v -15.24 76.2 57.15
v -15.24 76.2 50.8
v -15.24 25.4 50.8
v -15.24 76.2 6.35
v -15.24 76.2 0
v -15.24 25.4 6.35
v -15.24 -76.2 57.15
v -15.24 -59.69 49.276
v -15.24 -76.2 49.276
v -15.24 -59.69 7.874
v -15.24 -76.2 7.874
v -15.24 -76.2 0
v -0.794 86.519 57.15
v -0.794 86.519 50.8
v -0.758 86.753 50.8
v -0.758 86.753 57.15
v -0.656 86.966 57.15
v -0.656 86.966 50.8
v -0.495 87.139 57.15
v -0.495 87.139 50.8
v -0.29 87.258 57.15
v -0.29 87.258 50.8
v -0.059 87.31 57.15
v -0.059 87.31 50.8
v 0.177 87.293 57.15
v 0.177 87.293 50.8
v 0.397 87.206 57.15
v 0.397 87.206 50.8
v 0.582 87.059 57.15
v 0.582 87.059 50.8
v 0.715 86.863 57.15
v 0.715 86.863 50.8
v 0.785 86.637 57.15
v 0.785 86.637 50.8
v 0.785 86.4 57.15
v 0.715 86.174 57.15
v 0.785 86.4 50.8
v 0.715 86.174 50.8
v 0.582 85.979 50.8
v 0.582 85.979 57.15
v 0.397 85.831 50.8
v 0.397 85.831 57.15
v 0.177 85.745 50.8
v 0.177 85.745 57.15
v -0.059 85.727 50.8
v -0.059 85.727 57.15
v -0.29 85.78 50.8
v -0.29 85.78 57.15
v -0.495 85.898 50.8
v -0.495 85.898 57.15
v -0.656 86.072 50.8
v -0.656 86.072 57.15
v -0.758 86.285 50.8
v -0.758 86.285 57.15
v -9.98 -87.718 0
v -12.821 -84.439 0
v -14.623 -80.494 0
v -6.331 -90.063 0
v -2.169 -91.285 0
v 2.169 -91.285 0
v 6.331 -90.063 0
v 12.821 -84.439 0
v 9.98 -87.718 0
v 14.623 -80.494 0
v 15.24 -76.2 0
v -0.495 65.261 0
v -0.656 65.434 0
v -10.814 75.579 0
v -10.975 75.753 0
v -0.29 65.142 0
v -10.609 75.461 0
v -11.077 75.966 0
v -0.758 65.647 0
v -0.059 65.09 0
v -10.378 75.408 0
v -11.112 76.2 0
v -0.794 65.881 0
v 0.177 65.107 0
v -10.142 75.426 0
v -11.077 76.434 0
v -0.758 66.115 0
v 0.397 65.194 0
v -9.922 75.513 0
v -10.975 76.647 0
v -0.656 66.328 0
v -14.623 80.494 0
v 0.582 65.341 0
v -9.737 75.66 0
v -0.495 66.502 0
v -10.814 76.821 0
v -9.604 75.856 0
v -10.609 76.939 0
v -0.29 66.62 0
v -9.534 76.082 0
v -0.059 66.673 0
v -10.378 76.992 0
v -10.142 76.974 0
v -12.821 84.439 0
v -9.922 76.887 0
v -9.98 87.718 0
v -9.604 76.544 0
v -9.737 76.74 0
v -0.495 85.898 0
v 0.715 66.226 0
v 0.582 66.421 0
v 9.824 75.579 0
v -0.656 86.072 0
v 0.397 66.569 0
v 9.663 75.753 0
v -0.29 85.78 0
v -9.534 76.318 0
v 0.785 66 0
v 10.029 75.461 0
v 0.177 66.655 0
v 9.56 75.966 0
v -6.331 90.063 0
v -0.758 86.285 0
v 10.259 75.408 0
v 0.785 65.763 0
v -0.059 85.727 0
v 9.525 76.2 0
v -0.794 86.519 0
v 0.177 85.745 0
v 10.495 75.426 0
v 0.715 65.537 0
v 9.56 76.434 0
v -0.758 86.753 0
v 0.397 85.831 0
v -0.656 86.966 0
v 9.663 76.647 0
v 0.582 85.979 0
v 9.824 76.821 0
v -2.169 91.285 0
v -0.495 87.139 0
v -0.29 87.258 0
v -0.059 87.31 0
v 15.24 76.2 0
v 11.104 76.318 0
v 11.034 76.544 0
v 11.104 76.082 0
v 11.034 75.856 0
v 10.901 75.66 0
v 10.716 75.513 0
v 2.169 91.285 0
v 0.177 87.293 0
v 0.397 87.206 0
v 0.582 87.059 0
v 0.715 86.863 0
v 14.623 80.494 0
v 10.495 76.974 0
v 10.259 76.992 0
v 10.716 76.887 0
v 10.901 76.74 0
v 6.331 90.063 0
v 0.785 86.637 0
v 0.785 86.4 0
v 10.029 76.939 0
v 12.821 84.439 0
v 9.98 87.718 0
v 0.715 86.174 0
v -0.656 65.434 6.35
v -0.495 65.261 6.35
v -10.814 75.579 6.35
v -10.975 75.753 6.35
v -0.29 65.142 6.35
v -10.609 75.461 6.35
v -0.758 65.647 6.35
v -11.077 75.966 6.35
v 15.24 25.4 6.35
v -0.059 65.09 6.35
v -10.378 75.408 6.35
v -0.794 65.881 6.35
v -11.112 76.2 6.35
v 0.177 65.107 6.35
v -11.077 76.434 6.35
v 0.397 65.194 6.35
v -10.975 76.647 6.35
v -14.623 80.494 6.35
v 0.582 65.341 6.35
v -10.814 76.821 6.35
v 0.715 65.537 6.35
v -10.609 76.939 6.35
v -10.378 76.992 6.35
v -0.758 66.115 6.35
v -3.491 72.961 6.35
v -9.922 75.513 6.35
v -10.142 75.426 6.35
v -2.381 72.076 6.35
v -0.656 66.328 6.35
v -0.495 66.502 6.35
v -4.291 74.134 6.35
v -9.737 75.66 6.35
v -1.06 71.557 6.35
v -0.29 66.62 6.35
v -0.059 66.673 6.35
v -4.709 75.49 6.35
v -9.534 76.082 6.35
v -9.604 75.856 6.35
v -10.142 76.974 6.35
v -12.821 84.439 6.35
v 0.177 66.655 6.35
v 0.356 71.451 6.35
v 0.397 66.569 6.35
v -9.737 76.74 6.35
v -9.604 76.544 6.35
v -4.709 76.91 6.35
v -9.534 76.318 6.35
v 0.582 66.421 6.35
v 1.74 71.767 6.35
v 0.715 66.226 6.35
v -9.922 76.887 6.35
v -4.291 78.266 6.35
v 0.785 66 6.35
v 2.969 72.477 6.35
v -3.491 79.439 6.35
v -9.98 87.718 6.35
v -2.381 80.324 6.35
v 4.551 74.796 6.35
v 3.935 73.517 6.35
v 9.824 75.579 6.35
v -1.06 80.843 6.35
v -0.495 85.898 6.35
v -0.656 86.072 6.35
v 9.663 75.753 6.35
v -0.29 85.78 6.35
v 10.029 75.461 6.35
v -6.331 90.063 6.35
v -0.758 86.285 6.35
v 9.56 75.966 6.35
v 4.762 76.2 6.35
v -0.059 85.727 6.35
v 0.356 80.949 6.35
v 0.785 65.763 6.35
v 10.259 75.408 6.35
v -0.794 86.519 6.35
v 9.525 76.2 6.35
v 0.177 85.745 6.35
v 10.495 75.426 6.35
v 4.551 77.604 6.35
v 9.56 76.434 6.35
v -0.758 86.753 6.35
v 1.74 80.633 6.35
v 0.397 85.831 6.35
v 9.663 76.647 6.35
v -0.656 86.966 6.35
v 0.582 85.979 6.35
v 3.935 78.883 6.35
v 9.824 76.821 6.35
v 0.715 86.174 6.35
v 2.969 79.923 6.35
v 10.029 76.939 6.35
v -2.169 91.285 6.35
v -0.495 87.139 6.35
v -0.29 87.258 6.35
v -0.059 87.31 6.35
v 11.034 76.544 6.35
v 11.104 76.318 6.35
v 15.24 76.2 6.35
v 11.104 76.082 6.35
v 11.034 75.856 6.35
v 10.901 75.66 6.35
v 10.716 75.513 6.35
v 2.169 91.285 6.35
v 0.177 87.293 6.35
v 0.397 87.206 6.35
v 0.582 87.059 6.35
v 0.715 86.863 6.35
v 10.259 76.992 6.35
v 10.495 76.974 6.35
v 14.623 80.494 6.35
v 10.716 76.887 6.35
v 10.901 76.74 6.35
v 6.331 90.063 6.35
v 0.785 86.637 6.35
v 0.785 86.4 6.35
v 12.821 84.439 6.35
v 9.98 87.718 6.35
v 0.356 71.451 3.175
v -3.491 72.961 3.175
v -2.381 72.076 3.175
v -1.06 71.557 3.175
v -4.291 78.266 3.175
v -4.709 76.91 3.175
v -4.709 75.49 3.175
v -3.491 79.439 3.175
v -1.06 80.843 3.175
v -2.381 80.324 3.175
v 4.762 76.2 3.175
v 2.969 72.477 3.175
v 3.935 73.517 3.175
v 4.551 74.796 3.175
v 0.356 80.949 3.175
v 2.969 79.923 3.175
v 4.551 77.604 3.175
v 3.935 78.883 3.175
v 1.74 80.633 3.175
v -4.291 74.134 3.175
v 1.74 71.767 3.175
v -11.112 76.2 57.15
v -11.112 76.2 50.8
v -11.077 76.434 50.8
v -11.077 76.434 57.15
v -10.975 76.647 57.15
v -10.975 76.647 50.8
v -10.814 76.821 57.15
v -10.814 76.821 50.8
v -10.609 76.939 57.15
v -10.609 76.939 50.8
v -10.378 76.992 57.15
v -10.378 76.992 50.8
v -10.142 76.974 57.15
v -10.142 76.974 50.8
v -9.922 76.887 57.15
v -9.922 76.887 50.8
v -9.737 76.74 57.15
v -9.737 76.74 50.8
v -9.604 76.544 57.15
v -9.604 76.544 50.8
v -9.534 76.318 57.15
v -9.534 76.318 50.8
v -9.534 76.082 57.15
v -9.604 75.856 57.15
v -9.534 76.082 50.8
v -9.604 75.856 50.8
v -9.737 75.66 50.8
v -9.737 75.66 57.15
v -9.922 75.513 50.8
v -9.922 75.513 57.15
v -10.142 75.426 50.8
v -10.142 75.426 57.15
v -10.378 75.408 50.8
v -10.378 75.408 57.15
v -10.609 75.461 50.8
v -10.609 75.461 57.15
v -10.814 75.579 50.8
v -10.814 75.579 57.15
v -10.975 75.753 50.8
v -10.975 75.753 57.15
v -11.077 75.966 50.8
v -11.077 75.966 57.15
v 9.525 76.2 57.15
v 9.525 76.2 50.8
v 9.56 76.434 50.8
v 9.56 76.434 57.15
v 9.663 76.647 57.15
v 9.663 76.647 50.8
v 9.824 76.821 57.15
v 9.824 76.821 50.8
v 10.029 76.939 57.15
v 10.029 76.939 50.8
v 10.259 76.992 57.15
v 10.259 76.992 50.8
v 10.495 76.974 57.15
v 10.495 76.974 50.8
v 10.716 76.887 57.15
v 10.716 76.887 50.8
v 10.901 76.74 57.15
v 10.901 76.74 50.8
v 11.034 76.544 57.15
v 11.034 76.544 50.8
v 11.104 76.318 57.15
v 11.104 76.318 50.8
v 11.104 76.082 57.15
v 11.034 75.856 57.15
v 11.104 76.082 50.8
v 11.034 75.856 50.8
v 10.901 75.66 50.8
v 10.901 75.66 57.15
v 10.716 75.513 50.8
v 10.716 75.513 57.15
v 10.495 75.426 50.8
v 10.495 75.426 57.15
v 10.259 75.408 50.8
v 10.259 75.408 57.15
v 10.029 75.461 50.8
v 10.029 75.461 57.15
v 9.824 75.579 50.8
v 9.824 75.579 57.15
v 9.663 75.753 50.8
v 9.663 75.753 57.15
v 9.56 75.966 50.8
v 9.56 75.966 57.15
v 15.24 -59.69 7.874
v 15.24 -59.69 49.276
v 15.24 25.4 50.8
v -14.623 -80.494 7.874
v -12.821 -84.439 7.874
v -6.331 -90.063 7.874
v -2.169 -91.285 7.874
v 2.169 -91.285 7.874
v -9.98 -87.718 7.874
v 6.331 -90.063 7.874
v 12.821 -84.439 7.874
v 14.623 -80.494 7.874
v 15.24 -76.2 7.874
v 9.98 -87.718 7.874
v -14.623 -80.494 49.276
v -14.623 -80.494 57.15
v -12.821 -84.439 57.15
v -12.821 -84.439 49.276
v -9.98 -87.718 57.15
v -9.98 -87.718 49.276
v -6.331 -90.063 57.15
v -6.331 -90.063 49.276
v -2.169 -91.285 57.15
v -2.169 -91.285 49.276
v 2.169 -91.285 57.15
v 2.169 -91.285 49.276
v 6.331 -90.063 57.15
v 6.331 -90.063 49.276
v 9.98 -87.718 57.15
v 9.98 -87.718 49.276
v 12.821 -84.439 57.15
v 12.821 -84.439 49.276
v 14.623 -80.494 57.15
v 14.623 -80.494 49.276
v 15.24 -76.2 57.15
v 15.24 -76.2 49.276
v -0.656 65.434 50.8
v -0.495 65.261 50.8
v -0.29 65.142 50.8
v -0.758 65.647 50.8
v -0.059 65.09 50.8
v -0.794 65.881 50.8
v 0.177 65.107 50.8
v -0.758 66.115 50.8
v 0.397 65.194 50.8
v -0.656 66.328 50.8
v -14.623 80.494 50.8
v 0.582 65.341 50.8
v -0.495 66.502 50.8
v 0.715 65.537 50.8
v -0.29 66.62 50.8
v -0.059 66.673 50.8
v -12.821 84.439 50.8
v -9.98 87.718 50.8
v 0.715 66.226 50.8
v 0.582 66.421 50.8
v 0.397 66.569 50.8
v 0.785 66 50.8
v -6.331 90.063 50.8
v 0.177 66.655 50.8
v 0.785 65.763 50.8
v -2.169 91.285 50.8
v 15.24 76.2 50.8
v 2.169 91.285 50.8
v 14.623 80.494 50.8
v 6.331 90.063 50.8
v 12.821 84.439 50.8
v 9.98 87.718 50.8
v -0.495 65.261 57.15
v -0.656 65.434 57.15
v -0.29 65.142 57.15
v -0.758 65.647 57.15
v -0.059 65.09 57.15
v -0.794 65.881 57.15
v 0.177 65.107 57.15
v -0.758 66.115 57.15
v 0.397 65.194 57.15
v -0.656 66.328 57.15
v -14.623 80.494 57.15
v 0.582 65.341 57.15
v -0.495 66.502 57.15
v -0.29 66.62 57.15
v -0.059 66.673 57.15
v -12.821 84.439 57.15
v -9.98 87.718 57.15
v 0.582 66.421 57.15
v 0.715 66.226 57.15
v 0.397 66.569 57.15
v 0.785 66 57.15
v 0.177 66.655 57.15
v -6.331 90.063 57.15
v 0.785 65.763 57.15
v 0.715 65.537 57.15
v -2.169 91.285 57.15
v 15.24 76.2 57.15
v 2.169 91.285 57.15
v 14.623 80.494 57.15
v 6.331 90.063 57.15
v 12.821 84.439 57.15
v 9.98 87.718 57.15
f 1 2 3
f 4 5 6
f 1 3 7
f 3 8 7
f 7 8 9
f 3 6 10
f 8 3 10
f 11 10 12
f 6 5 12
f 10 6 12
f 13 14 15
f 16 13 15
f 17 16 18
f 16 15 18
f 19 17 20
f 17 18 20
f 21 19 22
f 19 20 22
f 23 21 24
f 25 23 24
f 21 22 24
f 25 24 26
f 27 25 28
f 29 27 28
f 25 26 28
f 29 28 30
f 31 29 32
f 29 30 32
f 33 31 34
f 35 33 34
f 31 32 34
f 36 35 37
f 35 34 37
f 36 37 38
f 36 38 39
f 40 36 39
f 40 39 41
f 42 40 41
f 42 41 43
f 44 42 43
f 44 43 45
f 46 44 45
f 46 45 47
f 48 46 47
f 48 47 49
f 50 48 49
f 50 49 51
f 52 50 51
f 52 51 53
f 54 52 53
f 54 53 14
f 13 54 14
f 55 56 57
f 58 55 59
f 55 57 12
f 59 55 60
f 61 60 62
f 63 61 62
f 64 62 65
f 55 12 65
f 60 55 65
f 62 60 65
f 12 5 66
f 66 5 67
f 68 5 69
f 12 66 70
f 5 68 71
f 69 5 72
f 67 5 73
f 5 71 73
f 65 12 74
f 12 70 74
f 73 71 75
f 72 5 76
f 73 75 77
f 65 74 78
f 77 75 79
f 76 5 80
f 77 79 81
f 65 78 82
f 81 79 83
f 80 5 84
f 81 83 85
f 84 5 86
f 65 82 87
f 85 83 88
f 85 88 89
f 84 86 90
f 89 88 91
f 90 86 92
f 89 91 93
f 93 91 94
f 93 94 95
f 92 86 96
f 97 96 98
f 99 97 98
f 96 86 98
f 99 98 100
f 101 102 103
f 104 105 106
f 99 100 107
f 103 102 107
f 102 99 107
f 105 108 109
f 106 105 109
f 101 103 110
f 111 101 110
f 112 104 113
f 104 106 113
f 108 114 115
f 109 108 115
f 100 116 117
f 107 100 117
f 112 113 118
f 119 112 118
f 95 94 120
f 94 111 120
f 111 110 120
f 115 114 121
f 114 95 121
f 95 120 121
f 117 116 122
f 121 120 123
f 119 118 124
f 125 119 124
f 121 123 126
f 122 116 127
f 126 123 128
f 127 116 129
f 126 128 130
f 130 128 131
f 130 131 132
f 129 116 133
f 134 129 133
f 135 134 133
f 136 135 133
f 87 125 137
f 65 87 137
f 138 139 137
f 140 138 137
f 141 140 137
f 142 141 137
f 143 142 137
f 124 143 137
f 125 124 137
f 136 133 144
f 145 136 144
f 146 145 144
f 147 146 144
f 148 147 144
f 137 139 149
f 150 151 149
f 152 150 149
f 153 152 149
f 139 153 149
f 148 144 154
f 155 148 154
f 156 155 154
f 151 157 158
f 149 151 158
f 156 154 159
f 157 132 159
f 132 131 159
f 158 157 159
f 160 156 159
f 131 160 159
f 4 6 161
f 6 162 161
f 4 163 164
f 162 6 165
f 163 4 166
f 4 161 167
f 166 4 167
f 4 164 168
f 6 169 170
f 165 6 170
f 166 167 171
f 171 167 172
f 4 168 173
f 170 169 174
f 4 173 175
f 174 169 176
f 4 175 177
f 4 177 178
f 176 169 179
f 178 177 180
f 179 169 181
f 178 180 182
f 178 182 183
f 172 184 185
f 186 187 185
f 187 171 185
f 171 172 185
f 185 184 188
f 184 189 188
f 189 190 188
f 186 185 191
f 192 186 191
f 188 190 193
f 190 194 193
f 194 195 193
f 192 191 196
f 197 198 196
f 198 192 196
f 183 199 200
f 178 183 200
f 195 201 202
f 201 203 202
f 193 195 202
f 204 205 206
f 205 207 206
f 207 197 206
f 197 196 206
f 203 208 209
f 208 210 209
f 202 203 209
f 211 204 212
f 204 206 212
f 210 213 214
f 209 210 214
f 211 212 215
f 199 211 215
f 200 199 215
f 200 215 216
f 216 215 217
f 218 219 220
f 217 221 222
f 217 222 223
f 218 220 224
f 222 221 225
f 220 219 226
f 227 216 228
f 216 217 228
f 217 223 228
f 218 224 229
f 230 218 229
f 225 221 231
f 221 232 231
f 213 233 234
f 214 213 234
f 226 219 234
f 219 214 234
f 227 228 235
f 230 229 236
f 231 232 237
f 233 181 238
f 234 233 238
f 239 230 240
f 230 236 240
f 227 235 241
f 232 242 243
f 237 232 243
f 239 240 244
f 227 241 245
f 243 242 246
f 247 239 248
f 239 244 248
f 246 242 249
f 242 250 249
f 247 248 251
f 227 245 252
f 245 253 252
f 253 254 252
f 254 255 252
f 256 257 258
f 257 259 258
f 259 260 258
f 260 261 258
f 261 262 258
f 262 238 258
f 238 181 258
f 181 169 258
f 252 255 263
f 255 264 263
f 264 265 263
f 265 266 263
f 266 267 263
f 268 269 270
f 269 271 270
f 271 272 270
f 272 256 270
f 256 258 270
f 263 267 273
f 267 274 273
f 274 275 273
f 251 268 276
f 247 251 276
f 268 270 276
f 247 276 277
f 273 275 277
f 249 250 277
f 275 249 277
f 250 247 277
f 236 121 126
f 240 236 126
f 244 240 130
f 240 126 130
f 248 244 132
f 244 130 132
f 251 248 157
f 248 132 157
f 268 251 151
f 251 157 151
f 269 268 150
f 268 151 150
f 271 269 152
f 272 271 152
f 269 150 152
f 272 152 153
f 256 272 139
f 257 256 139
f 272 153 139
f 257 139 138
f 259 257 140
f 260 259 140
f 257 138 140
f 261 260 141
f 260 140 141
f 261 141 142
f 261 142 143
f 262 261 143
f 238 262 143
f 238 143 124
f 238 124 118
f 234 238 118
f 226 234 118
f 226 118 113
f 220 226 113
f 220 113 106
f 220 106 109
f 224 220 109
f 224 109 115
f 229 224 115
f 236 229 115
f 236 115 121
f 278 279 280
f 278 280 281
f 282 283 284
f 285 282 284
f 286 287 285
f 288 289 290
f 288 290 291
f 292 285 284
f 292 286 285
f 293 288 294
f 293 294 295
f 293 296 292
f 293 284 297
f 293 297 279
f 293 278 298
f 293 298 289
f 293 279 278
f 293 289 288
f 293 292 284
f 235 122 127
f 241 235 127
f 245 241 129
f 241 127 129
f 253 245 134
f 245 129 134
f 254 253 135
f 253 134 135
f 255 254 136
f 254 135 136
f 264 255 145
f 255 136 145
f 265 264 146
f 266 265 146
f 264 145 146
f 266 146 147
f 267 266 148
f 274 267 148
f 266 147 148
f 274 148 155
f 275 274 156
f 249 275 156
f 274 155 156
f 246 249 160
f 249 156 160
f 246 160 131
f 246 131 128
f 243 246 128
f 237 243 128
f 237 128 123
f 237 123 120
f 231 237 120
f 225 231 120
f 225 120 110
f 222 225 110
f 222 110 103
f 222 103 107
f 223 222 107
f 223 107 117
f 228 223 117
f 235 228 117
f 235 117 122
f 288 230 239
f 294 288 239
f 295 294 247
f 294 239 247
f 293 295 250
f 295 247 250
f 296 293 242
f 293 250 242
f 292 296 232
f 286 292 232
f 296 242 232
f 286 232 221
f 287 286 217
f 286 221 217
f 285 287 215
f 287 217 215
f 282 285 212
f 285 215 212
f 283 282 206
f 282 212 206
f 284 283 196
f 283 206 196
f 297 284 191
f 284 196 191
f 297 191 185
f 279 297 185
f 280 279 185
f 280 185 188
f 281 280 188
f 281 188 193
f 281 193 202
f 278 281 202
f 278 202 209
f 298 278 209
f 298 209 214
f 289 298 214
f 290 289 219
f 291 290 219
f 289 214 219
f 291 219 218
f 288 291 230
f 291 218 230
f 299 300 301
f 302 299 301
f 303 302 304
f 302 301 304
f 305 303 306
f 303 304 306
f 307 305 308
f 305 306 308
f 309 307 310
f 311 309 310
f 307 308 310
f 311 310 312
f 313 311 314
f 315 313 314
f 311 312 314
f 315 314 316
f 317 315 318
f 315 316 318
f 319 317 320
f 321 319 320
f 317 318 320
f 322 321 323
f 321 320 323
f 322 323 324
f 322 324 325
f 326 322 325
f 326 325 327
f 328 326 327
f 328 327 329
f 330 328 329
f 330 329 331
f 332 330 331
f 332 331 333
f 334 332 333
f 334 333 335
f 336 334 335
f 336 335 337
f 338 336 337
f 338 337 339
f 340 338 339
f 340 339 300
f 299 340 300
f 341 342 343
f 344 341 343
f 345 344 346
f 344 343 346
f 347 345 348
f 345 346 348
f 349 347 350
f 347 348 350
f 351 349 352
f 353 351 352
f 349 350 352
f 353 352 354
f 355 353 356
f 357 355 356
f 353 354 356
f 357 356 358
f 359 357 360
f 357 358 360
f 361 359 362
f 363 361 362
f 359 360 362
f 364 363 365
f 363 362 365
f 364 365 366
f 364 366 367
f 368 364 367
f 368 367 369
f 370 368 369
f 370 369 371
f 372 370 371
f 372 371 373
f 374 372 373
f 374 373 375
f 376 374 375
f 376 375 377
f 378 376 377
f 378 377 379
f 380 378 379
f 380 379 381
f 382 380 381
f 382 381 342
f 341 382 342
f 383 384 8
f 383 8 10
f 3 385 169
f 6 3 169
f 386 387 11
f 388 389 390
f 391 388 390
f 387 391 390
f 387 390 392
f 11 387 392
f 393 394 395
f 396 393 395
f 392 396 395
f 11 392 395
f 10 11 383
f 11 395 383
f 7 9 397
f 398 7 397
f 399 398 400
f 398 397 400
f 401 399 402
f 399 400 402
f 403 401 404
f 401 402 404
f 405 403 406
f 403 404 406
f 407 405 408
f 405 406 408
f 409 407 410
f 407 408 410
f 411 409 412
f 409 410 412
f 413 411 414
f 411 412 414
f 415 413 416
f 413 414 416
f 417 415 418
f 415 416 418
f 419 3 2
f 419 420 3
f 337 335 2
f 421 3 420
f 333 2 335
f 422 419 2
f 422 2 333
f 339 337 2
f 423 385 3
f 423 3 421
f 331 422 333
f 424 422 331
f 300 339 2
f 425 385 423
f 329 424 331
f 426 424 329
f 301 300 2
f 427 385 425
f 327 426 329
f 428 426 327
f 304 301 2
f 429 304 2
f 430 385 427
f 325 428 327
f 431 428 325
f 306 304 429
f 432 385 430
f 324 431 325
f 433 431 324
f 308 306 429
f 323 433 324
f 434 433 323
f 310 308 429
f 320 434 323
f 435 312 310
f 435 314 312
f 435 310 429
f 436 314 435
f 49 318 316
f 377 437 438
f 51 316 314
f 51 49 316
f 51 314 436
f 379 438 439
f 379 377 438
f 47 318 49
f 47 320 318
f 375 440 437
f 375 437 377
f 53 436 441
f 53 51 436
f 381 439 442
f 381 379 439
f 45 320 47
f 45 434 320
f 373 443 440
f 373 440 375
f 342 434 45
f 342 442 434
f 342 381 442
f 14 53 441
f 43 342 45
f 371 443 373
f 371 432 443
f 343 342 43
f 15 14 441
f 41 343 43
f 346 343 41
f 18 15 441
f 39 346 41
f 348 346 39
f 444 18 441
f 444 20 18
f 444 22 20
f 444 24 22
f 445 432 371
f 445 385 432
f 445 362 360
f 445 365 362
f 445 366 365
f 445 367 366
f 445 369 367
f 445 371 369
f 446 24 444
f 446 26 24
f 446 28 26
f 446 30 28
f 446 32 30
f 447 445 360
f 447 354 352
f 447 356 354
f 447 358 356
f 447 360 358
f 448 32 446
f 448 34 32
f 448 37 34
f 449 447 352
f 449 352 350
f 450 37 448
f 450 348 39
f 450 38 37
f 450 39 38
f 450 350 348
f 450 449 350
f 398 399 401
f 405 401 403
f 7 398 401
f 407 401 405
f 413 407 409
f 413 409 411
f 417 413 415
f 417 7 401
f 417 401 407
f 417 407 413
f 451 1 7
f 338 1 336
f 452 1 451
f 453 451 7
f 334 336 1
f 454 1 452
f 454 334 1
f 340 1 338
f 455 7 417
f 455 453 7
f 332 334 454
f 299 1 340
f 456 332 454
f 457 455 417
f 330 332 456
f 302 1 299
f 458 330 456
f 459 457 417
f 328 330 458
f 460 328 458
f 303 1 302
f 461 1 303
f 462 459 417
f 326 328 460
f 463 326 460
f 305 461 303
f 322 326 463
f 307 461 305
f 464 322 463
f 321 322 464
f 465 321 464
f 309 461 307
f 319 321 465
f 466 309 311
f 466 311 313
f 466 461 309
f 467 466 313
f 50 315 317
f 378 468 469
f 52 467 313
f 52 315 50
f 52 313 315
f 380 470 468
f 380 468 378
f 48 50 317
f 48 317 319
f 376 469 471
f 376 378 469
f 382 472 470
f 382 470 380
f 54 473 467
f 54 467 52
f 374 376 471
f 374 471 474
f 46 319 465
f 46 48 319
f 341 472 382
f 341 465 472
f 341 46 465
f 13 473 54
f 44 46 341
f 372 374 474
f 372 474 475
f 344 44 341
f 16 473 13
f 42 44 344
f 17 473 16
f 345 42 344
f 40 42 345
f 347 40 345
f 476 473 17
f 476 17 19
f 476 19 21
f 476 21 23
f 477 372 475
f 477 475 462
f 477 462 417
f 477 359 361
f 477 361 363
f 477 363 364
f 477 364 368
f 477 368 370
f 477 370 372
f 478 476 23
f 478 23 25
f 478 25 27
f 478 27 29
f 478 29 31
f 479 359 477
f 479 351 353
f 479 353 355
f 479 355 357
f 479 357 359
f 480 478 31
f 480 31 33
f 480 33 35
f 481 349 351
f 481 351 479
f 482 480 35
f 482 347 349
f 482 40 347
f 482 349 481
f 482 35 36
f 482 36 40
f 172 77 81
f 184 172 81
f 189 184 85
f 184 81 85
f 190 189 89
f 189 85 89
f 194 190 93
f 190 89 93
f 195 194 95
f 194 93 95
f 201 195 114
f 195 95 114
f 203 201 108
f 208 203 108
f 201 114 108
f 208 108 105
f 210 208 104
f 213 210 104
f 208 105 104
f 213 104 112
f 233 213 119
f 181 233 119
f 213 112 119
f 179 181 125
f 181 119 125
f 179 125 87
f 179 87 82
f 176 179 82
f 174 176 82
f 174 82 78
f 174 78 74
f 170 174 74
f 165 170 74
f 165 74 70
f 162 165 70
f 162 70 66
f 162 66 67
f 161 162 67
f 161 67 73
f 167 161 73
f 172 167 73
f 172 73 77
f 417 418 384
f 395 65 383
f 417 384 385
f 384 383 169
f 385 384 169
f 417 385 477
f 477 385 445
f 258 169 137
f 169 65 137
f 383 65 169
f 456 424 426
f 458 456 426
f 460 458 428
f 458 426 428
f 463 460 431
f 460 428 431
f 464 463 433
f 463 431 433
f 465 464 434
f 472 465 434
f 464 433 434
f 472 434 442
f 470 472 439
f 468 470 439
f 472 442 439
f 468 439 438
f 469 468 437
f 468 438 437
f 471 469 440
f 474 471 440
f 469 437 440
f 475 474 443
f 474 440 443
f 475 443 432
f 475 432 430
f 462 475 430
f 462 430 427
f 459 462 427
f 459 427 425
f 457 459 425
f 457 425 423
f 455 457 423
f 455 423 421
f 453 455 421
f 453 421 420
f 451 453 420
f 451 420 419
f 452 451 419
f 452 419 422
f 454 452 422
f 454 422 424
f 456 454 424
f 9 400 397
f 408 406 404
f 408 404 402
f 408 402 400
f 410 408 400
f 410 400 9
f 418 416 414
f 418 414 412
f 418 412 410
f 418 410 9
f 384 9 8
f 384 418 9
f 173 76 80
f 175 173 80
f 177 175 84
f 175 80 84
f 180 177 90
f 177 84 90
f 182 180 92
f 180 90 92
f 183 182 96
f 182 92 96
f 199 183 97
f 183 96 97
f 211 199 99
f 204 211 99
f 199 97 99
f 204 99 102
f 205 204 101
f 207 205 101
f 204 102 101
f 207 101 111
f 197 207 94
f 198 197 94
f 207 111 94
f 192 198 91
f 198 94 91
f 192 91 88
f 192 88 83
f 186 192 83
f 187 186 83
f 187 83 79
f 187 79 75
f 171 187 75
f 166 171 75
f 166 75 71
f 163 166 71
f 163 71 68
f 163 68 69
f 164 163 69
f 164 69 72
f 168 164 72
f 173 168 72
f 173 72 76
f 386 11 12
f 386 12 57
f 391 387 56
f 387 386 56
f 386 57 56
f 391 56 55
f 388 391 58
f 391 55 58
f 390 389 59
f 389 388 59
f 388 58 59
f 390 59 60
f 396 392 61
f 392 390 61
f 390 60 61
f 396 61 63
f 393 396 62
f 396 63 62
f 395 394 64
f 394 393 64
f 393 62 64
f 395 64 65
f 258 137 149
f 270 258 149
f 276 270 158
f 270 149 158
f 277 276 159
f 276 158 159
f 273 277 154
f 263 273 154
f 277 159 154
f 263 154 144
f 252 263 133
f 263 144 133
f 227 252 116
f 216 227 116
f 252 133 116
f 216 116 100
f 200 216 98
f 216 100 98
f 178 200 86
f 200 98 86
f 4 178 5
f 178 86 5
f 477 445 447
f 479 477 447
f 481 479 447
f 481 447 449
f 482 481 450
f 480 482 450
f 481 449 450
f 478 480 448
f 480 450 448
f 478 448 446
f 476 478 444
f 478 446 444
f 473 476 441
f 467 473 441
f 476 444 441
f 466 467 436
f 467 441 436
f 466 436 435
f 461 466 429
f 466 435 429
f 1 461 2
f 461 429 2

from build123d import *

# Parameters (mm, degrees)
BOSS_EXTRUDE1_DEPTH = 57.15
SKETCH2_W           = 44.45
SKETCH2_H           = 66.04
CUT_EXTRUDE1_DEPTH  = 57.15
SKETCH6_R           = 4.7625
CUT_EXTRUDE3_DEPTH  = 3.175
SKETCH8_R           = 0.79375
CUT_EXTRUDE4_DEPTH  = 58.15
SKETCH9_W           = 41.402
SKETCH9_H           = 31.75
CUT_EXTRUDE5_DEPTH  = 31.48


with BuildPart() as part:
    # Sketch1 → Boss-Extrude1 (new body)
    with BuildSketch(Plane.XY):
        with BuildLine():
            Line((-15.24, 76.2), (-15.24, -76.2))
            ThreePointArc((-15.24, -76.2), (0, -91.44), (15.24, -76.2))
            Line((15.24, -76.2), (15.24, 76.2))
            ThreePointArc((15.24, 76.2), (0, 91.44), (-15.24, 76.2))
        make_face()
    extrude(amount=BOSS_EXTRUDE1_DEPTH)

    # Sketch2 → Cut-Extrude1 (cut)
    with BuildSketch(Plane(origin=(15.24, 0, 0), x_dir=(0, 0, -1), z_dir=(1, 0, 0))):
        with Locations((-28.575, 58.42)):
            Rectangle(SKETCH2_W, SKETCH2_H)
    extrude(amount=-CUT_EXTRUDE1_DEPTH, mode=Mode.SUBTRACT)

    # Sketch6 → Cut-Extrude3 (cut)
    with BuildSketch(Plane.XY.offset(6.35)):
        with Locations((0, 76.2)):
            Circle(SKETCH6_R)
    extrude(amount=-CUT_EXTRUDE3_DEPTH, mode=Mode.SUBTRACT)

    # Sketch8 → Cut-Extrude4 (cut, through all)
    with BuildSketch(Plane(origin=(0, 0, 0), x_dir=(-1, 0, 0), z_dir=(0, 0, -1))):
        with Locations((0, 65.88125)):
            Circle(SKETCH8_R)
        with Locations((-10.31875, 76.2)):
            Circle(SKETCH8_R)
        with Locations((0, 86.51875)):
            Circle(SKETCH8_R)
        with Locations((10.31875, 76.2)):
            Circle(SKETCH8_R)
    extrude(amount=-CUT_EXTRUDE4_DEPTH, mode=Mode.SUBTRACT)

    # Sketch9 → Cut-Extrude5 (cut, through all)
    with BuildSketch(Plane(origin=(15.24, 0, 0), x_dir=(0, 0, -1), z_dir=(1, 0, 0))):
        with Locations((-28.575, -75.565)):
            Rectangle(SKETCH9_W, SKETCH9_H)
    extrude(amount=-CUT_EXTRUDE5_DEPTH, mode=Mode.SUBTRACT)


solid = part.part
